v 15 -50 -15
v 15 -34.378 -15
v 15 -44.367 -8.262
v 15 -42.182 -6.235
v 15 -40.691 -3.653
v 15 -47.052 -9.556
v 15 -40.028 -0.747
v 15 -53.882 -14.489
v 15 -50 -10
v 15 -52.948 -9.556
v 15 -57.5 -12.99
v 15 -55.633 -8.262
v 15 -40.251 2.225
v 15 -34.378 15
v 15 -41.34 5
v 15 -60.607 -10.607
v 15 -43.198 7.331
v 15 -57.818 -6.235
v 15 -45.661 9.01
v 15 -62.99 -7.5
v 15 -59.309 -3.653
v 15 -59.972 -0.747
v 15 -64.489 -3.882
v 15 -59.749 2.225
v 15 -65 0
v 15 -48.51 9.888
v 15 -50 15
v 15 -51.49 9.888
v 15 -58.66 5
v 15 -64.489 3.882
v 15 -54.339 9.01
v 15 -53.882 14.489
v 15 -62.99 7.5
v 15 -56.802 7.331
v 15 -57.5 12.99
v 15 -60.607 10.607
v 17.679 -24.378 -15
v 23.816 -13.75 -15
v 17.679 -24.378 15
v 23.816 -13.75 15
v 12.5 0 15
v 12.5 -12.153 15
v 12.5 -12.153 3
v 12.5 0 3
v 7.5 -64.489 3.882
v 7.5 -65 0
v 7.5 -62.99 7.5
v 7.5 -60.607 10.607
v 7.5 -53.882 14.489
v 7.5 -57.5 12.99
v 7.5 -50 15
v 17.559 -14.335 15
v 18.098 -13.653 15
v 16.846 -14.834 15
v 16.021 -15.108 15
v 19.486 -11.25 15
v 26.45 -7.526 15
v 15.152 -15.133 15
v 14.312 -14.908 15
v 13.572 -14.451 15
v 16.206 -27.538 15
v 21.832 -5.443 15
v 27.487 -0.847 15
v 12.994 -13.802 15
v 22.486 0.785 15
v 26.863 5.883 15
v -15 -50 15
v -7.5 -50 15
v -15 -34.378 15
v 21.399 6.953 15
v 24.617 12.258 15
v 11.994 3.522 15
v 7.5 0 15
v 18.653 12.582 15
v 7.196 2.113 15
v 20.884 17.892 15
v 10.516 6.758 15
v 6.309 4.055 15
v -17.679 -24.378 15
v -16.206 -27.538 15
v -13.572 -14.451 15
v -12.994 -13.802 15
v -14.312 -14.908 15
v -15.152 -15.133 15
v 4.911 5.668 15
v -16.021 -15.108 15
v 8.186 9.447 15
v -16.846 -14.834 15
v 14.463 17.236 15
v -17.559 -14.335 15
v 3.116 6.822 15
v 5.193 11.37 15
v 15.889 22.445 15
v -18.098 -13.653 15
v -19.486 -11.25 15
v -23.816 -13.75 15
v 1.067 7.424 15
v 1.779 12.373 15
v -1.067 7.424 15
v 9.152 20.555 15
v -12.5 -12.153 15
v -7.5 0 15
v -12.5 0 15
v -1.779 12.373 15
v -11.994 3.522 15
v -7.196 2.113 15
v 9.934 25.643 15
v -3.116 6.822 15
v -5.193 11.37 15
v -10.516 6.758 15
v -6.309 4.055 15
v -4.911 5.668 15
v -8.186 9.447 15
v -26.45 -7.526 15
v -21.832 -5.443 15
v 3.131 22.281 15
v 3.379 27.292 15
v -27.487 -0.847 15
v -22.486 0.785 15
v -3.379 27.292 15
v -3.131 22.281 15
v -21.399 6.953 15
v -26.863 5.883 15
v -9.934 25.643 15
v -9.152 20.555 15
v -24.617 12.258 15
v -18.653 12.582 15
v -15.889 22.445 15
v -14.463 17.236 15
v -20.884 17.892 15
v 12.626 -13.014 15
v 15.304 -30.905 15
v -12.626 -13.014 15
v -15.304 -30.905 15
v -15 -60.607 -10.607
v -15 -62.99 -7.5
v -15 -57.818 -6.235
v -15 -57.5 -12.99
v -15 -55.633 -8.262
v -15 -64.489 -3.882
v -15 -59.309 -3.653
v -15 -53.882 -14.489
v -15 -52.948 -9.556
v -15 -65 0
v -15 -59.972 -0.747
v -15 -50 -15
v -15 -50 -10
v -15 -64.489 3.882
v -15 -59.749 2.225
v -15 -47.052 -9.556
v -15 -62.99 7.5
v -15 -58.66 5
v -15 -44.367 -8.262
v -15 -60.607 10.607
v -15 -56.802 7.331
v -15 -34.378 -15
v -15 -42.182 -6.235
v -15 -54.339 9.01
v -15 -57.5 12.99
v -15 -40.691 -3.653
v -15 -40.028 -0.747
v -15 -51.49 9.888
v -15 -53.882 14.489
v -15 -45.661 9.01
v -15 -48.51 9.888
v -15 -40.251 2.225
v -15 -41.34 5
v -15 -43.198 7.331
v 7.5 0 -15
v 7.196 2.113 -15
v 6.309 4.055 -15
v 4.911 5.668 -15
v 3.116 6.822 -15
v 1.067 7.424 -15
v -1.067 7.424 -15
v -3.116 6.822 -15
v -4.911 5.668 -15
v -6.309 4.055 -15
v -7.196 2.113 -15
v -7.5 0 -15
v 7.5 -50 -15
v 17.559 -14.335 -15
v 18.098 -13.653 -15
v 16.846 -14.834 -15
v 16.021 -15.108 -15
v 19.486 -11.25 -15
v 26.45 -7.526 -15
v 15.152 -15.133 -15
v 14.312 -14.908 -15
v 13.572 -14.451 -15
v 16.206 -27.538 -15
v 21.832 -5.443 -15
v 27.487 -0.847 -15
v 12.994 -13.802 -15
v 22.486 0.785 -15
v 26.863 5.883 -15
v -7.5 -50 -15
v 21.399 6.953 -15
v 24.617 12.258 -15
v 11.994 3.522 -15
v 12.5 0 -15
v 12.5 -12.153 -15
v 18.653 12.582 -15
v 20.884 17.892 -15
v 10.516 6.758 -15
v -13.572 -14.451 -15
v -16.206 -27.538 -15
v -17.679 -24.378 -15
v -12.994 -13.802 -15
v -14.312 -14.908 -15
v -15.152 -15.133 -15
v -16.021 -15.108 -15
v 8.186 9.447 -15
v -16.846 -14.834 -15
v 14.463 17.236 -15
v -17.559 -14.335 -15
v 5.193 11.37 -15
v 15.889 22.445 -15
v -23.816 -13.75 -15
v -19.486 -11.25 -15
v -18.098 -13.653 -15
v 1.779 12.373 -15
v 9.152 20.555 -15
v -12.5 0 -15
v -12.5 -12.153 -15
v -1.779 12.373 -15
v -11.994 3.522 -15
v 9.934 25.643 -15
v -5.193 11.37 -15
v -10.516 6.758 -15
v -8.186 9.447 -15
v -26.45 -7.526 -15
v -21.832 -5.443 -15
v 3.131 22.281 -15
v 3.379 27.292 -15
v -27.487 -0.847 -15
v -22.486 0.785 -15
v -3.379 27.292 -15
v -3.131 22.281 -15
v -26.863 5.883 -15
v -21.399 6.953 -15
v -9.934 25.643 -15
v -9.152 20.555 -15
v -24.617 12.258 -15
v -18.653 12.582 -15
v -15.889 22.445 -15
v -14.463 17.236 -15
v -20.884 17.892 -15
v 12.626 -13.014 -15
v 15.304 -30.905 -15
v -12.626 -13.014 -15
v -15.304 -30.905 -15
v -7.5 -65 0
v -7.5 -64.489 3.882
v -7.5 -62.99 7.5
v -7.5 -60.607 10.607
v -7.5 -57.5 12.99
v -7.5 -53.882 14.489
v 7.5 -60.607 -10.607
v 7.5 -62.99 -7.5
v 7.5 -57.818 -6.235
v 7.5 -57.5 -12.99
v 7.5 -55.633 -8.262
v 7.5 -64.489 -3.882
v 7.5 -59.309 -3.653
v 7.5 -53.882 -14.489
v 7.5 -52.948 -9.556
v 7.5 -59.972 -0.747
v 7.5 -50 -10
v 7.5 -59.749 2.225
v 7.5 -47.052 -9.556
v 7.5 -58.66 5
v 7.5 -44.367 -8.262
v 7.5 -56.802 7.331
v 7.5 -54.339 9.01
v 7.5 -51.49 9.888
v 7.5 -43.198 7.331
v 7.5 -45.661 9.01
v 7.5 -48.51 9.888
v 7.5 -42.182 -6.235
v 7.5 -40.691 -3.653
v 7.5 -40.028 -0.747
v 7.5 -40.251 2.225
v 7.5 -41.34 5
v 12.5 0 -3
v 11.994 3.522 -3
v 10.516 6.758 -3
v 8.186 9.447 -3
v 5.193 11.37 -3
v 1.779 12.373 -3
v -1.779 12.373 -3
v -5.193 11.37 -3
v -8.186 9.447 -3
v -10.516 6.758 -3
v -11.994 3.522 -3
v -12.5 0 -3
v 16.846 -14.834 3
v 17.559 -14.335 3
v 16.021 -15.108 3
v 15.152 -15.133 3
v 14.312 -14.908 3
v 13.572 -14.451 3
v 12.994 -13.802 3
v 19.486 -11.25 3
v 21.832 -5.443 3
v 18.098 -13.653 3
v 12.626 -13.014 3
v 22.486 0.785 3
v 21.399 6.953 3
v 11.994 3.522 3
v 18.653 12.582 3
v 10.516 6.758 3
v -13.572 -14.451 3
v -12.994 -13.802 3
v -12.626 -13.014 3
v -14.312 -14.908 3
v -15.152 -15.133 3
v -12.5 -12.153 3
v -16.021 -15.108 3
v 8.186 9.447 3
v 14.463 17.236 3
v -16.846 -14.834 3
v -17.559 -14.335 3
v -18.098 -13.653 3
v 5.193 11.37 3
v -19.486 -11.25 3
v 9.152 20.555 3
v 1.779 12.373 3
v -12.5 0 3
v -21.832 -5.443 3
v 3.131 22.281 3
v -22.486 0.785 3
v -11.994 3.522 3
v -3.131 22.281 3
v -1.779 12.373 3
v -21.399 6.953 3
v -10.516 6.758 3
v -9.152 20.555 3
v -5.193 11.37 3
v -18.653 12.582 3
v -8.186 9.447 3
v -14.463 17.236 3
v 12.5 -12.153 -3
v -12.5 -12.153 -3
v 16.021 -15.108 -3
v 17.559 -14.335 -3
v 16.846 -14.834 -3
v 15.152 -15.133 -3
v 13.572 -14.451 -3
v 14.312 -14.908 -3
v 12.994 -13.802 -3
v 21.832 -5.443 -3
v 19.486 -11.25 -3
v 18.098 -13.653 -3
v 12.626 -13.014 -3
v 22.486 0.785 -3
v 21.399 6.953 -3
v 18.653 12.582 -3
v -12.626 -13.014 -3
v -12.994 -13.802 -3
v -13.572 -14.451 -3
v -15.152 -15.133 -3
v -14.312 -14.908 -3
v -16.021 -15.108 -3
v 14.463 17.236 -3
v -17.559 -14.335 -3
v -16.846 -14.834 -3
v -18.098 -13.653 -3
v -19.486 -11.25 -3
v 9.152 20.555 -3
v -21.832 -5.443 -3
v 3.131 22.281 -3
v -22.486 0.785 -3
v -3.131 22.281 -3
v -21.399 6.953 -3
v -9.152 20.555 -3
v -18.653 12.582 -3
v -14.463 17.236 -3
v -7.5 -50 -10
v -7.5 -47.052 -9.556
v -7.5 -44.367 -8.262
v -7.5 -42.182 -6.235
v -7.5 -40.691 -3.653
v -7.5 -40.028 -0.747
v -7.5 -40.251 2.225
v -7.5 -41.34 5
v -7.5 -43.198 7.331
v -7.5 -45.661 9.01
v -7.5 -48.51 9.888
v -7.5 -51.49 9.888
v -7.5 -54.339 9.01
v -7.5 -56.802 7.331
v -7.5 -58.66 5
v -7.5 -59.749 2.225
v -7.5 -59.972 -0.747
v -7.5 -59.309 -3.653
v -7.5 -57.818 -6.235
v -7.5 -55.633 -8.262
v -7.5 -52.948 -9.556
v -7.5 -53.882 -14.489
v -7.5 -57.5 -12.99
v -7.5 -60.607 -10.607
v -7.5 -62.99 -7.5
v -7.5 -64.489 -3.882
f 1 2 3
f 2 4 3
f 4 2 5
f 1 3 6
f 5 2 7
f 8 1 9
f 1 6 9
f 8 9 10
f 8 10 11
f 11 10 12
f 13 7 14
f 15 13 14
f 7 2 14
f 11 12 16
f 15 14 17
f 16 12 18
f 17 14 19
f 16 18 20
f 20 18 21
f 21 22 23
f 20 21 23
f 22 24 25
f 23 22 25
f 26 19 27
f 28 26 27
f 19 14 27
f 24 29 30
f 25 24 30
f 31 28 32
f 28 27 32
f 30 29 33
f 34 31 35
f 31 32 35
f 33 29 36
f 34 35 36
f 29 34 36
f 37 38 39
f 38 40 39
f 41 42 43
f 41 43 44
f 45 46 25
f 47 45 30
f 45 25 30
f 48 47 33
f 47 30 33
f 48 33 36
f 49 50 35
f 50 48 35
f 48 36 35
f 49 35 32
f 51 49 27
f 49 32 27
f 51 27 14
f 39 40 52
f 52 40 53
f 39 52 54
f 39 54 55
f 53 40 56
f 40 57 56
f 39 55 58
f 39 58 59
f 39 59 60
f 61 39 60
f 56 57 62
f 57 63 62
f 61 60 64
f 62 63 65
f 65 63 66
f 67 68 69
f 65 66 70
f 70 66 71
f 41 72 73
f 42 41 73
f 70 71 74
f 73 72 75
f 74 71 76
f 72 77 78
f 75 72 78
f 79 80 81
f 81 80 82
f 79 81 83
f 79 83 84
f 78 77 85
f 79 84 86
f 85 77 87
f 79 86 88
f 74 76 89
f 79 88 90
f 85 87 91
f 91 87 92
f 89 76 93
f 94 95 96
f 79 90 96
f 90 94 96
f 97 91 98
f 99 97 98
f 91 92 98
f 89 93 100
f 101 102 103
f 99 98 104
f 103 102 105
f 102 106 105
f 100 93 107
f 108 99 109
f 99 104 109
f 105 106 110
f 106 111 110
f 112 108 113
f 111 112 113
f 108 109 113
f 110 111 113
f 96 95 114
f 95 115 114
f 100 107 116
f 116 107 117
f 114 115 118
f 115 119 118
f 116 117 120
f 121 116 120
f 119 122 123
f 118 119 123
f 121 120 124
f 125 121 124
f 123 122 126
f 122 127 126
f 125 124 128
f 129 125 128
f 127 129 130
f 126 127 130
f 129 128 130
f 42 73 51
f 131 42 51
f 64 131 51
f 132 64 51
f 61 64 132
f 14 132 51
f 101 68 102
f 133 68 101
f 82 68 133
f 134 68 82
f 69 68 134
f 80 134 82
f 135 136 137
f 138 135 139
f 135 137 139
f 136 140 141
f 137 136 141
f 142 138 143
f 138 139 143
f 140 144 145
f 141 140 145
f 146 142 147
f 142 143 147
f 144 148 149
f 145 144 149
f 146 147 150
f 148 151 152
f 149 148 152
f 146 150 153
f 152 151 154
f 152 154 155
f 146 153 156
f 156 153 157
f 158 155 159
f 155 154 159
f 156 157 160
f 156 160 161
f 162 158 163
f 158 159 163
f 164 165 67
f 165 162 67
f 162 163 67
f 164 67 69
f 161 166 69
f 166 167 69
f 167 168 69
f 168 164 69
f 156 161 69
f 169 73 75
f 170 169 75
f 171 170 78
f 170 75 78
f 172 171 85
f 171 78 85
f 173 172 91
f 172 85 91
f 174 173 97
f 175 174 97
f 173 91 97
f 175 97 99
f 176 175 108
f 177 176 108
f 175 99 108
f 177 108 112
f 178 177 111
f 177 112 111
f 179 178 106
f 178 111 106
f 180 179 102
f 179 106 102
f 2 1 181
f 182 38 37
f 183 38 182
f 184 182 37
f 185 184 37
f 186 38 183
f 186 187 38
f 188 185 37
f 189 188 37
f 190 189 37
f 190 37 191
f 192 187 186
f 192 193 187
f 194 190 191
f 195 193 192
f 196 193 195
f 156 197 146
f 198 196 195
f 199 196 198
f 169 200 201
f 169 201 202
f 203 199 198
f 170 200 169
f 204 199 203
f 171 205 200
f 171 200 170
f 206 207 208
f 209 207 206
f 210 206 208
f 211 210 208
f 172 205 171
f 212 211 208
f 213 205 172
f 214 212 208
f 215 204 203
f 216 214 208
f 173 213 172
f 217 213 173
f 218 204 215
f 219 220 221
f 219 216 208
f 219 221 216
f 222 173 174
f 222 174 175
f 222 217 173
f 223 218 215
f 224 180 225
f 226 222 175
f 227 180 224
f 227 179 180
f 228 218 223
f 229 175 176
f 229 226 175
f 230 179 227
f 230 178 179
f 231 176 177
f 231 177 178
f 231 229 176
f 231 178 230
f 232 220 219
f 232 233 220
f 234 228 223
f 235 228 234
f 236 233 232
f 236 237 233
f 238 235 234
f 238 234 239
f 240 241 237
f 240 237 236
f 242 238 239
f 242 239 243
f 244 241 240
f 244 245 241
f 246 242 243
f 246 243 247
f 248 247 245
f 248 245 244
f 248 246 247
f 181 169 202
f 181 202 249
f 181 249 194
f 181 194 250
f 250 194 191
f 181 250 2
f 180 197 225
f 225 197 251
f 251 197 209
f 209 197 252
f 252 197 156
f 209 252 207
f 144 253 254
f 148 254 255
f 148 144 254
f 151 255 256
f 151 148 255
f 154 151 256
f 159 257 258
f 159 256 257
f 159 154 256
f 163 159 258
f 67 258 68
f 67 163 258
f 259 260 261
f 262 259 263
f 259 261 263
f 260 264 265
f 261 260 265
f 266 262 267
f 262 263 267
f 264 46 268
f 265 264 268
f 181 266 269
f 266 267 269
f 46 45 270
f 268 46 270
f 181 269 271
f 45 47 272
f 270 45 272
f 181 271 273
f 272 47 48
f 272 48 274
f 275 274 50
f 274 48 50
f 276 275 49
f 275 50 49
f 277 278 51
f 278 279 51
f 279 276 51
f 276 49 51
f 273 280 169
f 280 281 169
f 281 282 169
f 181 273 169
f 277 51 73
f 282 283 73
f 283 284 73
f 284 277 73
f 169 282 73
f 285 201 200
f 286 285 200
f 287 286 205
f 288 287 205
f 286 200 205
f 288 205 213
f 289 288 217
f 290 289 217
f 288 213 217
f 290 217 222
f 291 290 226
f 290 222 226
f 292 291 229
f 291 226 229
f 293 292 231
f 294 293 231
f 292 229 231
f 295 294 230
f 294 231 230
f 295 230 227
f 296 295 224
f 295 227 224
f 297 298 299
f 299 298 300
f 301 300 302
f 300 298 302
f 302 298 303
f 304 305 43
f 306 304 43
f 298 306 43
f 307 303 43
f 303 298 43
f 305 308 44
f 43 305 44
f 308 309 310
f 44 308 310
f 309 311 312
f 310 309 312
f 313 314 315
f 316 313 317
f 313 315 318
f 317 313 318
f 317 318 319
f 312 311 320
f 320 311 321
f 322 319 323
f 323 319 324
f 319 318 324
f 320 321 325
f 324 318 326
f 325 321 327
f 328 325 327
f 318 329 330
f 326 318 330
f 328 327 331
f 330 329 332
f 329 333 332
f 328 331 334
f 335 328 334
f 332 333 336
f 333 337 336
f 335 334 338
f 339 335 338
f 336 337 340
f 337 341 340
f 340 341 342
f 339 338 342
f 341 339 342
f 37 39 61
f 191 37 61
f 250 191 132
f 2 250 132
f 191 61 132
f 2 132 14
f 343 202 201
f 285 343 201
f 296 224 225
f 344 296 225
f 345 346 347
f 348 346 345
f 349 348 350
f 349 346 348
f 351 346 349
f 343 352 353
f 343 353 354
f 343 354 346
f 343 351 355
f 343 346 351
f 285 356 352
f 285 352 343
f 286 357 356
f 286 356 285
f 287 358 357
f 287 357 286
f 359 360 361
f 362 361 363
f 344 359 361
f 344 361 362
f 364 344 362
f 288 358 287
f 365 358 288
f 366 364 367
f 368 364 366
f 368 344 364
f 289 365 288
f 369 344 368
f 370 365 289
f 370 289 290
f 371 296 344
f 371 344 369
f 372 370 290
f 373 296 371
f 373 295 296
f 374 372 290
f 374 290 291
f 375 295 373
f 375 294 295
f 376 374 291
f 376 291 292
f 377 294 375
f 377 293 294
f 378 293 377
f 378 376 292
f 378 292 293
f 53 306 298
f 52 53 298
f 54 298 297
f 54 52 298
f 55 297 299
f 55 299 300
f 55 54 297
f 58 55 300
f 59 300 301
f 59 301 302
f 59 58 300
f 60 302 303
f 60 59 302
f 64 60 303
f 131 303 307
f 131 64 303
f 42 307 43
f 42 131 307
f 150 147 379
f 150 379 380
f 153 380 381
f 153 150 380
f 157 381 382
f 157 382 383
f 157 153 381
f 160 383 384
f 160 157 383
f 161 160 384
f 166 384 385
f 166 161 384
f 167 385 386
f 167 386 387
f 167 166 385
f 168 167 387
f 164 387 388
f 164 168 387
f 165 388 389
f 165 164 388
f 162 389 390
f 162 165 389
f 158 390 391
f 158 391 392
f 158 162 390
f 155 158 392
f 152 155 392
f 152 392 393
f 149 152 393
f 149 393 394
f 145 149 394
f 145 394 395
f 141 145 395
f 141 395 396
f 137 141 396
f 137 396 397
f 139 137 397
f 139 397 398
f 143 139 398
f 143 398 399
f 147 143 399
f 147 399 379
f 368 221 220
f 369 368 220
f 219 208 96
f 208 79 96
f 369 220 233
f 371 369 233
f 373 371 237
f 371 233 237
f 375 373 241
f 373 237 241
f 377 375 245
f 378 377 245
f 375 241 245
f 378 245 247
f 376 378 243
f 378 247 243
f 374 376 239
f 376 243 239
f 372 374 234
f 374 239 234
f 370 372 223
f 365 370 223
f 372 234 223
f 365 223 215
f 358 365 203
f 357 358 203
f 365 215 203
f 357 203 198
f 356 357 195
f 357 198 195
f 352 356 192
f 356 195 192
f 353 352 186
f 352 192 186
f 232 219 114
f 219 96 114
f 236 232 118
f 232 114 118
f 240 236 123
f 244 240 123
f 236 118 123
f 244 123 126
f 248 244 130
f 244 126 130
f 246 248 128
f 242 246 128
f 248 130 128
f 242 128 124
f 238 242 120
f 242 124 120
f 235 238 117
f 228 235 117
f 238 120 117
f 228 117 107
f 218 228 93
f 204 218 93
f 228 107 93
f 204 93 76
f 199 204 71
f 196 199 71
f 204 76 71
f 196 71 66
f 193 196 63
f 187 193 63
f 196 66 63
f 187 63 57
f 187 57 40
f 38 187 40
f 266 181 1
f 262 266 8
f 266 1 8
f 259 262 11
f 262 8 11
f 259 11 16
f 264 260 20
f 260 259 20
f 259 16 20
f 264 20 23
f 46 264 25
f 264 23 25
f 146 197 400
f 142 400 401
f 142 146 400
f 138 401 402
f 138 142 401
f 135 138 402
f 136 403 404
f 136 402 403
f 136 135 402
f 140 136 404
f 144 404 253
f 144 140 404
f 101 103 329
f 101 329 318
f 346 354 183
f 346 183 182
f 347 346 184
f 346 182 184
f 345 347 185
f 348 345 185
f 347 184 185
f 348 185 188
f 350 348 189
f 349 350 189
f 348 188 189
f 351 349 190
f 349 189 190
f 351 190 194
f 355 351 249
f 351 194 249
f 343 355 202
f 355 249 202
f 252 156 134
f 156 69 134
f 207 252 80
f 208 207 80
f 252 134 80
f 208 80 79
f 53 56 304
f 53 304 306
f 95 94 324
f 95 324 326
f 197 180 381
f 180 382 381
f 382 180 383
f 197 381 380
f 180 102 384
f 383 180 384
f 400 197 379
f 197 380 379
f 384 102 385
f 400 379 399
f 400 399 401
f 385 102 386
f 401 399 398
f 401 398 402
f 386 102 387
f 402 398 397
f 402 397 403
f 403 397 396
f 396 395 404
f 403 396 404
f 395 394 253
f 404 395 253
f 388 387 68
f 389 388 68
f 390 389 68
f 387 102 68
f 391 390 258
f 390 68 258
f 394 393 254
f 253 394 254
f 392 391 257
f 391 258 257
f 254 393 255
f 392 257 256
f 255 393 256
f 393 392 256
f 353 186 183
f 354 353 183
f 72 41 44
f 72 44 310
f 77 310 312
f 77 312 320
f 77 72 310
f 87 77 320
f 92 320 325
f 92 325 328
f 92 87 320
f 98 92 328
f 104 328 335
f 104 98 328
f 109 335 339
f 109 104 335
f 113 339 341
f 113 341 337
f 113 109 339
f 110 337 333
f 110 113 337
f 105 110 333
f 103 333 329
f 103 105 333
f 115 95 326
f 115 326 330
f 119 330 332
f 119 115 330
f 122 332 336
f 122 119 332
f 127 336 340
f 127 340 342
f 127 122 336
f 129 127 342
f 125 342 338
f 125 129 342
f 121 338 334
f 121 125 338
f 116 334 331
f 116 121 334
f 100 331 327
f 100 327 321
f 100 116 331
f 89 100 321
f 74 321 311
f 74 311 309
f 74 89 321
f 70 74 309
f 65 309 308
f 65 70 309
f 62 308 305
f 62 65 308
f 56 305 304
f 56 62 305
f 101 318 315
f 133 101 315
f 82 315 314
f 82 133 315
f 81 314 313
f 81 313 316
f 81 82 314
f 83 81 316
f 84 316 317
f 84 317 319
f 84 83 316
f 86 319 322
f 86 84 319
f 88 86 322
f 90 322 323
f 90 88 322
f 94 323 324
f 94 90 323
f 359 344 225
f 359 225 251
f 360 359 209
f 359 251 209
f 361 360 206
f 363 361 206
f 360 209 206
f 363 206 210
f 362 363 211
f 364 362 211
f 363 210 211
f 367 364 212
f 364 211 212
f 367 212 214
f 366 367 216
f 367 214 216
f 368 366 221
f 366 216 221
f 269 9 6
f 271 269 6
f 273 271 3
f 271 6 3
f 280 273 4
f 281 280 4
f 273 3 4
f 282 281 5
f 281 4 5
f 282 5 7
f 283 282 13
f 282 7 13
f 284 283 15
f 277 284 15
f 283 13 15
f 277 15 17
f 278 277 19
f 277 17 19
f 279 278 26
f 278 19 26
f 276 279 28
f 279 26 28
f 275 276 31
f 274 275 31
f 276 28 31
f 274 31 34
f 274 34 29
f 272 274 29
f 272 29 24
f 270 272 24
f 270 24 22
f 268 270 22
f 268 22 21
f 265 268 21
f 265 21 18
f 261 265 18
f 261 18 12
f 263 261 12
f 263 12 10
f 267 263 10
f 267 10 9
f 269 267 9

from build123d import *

# Parameters (mm, degrees)
BOSS_EXTRUDE1_DEPTH = 15
CUT_EXTRUDE1_DEPTH  = 12
CUT_EXTRUDE2_REACH  = 81.096
SKETCH3_R           = 10


with BuildPart() as part:
    # Sketch1 → Boss-Extrude1 (new body)
    with BuildSketch(Plane.XY):
        with BuildLine():
            Line((-7.5, 0), (-7.5, -65))
            Line((-7.5, -65), (-15, -65))
            Line((-15, -65), (-15, -42.295968202))
            Line((-15, -42.295968202), (-15, -34.378221735))
            ThreePointArc((-15, -34.378221735), (-15.681483474, -29.201840833), (-17.679491924, -24.378221735))
            Line((-17.679491924, -24.378221735), (-23.815698604, -13.75))
            ThreePointArc((-23.815698604, -13.75), (0, 27.5), (23.815698604, -13.75))
            Line((23.815698604, -13.75), (17.679491924, -24.378221735))
            ThreePointArc((17.679491924, -24.378221735), (15.681483474, -29.201840833), (15, -34.378221735))
            Line((15, -34.378221735), (15, -65))
            Line((15, -65), (7.5, -65))
            Line((7.5, -65), (7.5, 0))
            ThreePointArc((7.5, 0), (0, 7.5), (-7.5, 0))
        make_face()
    extrude(amount=BOSS_EXTRUDE1_DEPTH)

    # Sketch2 → Cut-Extrude1 (cut)
    with BuildSketch(Plane.XY.offset(15)):
        with BuildLine():
            Line((-12.5, 0), (-12.5, -12.153212483))
            ThreePointArc((-12.5, -12.153212483), (-14.723542865, -15.050989962), (-18.098076211, -13.653212483))
            Line((-18.098076211, -13.653212483), (-19.485571585, -11.25))
            ThreePointArc((-19.485571585, -11.25), (0, 22.5), (19.485571585, -11.25))
            Line((19.485571585, -11.25), (18.098076211, -13.653212483))
            ThreePointArc((18.098076211, -13.653212483), (14.723542865, -15.050989962), (12.5, -12.153212483))
            Line((12.5, -12.153212483), (12.5, 0))
            ThreePointArc((12.5, 0), (0, 12.5), (-12.5, 0))
        make_face()
    extrude(amount=-CUT_EXTRUDE1_DEPTH, mode=Mode.SUBTRACT)

    # Mirror1: part across plane


with BuildPart() as part_1:
    add(part.part)
    add(part.part.mirror(Plane.XY))

    # Sketch3 → Cut-Extrude2 (cut, up to next)
    with BuildSketch(Plane(origin=(15, 0, 0), x_dir=(0, 0, -1), z_dir=(1, 0, 0)), mode=Mode.PRIVATE) as cut_extrude2_sk1:
        with BuildLine():
            Line((15, -65), (15, -50))
            ThreePointArc((15, -50), (10.606601718, -60.606601718), (0, -65))
            Line((0, -65), (15, -65))
        make_face()
    cut_extrude2_tool1 = extrude(cut_extrude2_sk1.sketch, amount=-CUT_EXTRUDE2_REACH, mode=Mode.PRIVATE) & part_1.part
    # Sketch3 → Cut-Extrude2 (cut, up to next)
    with BuildSketch(Plane(origin=(15, 0, 0), x_dir=(0, 0, -1), z_dir=(1, 0, 0)), mode=Mode.PRIVATE) as cut_extrude2_sk2:
        with BuildLine():
            ThreePointArc((0, -65), (-10.606601718, -60.606601718), (-15, -50))
            Line((-15, -50), (-15, -65))
            Line((-15, -65), (0, -65))
        make_face()
    cut_extrude2_tool2 = extrude(cut_extrude2_sk2.sketch, amount=-CUT_EXTRUDE2_REACH, mode=Mode.PRIVATE) & part_1.part
    # Sketch3 → Cut-Extrude2 (cut, up to next)
    with BuildSketch(Plane(origin=(15, 0, 0), x_dir=(0, 0, -1), z_dir=(1, 0, 0)), mode=Mode.PRIVATE) as cut_extrude2_sk3:
        with Locations((0, -50)):
            Circle(SKETCH3_R)
    cut_extrude2_tool3 = extrude(cut_extrude2_sk3.sketch, amount=-CUT_EXTRUDE2_REACH, mode=Mode.PRIVATE) & part_1.part
    cut_extrude2_1 = cut_extrude2_tool1.solids().sort_by_distance((15, -61.649481, -11.649481))[0]
    add(cut_extrude2_1, mode=Mode.SUBTRACT)
    cut_extrude2_2 = cut_extrude2_tool2.solids().sort_by_distance((15, -61.649481, 11.649481))[0]
    add(cut_extrude2_2, mode=Mode.SUBTRACT)
    cut_extrude2_3 = cut_extrude2_tool3.solids().sort_by_distance((15, -50, 0))[0]
    add(cut_extrude2_3, mode=Mode.SUBTRACT)
    cut_extrude2 = cut_extrude2_1 + cut_extrude2_2 + cut_extrude2_3  # Cut-Extrude2 as one shape, for the pattern or mirror that repeats it

    # Mirror2: Cut-Extrude2 across plane
    add(cut_extrude2.mirror(Plane(origin=(0, 0, 0), x_dir=(0, 0, 1), z_dir=(1, 0, 0))), mode=Mode.SUBTRACT)


solid = part_1.part
